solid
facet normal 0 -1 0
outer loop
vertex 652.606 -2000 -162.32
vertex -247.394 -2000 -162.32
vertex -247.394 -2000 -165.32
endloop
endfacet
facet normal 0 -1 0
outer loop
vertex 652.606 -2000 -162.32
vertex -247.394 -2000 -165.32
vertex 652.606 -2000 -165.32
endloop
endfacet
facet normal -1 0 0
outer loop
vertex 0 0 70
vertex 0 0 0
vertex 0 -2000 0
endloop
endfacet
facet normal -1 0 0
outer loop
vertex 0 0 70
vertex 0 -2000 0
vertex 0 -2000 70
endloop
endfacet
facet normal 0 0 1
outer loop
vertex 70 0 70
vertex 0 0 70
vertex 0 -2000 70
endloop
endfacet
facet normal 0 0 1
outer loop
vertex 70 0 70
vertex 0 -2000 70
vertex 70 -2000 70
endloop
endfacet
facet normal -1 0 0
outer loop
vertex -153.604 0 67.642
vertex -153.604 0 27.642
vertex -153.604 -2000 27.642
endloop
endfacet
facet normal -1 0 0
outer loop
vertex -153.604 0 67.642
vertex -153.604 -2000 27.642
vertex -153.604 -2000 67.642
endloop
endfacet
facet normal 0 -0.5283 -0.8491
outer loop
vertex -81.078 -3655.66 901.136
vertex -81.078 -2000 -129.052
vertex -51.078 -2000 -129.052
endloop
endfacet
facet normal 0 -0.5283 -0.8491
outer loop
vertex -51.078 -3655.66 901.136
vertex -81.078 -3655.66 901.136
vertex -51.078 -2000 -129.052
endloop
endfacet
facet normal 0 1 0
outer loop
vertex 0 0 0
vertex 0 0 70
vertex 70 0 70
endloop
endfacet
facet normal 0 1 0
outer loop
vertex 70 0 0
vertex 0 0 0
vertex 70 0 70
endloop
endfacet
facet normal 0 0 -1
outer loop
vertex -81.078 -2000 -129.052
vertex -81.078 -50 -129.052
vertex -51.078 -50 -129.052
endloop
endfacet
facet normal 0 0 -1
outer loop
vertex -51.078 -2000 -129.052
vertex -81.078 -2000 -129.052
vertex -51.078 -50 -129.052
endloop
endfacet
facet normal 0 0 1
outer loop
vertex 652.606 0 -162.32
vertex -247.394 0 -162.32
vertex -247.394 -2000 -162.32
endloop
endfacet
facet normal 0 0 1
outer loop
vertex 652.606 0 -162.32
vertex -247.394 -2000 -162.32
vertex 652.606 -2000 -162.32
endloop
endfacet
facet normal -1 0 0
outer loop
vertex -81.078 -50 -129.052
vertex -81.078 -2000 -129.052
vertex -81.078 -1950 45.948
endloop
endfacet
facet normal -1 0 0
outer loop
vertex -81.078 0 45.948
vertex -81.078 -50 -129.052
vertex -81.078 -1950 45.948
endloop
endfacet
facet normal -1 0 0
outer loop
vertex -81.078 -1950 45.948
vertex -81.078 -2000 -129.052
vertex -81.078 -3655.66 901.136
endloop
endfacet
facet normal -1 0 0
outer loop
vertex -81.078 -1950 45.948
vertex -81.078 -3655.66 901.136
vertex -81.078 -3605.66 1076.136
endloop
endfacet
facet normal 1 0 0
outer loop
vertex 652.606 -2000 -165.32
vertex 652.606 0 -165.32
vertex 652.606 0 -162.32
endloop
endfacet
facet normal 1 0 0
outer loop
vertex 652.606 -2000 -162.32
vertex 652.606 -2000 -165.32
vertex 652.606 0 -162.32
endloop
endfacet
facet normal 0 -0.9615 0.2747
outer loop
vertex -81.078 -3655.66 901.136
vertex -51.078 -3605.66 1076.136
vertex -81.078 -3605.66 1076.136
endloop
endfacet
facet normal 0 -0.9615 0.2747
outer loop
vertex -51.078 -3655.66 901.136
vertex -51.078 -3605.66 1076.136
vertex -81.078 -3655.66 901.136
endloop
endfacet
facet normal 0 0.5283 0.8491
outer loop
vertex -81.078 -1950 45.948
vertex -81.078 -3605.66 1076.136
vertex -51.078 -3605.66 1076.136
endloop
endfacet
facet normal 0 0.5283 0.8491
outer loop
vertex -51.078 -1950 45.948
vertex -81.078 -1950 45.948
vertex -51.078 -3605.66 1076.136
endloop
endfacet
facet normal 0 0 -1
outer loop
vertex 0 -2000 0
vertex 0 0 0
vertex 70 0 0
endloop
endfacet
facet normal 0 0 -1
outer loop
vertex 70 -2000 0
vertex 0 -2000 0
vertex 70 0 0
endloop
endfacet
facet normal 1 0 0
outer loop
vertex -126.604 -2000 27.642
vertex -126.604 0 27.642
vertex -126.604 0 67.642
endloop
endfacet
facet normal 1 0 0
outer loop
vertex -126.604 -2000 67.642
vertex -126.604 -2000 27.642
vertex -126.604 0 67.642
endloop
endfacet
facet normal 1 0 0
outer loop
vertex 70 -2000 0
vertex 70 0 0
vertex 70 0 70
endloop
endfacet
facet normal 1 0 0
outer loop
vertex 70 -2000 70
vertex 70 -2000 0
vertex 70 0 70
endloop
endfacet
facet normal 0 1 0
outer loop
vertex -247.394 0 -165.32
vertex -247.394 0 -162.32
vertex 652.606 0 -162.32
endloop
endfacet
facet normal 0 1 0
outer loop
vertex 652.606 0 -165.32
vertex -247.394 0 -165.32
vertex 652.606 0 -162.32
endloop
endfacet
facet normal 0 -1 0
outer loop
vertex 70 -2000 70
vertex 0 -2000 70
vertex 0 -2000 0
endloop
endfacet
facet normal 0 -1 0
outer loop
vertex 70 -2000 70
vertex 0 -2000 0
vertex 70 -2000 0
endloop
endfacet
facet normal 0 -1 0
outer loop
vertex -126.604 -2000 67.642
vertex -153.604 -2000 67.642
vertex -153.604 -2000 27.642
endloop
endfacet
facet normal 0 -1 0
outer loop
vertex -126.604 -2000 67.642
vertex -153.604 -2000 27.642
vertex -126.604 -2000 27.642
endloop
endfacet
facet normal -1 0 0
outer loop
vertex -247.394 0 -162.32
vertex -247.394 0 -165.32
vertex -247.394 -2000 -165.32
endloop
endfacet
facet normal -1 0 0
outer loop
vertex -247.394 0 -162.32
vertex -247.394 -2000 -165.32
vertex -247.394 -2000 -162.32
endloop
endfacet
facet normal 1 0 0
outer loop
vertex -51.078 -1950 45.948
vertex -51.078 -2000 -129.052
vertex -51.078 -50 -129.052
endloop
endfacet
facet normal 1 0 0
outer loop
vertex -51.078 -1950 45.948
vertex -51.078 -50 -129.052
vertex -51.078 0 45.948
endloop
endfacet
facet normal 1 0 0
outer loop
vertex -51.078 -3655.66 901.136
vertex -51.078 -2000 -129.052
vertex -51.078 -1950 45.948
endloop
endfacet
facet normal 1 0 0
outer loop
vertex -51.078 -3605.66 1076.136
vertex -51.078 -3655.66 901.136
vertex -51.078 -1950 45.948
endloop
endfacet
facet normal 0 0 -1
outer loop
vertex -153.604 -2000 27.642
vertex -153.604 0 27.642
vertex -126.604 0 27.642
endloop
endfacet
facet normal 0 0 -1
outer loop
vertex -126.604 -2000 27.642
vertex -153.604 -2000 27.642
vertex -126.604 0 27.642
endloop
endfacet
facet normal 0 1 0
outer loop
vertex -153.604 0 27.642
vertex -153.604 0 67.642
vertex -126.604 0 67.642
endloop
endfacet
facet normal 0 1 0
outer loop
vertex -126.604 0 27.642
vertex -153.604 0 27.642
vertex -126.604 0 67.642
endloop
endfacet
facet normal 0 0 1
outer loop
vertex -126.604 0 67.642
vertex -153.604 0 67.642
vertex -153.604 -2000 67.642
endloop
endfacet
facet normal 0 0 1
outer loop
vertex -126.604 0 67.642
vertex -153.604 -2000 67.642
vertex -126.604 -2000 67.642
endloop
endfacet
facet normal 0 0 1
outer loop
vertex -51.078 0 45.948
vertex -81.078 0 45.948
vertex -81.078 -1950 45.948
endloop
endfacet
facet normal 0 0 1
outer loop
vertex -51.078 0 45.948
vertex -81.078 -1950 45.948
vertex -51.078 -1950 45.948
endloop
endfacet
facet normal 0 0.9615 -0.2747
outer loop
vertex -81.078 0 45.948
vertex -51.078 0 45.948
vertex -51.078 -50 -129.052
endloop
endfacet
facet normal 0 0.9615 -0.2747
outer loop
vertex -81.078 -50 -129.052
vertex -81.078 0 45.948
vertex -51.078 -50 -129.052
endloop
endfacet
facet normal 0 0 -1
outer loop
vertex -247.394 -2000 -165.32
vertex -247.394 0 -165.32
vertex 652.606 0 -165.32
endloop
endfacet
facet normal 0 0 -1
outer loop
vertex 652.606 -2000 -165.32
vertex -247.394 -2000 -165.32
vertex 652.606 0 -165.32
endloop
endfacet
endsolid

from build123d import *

# Parameters (mm, degrees)
F0_W     = 70
F0_H     = 70
F1_DEPTH = 2000
F2_W     = 30
F2_H     = 175
F3_DEPTH = 2000
F4_W     = 27
F4_H     = 40
F5_DEPTH = 2000
F6_W     = 900
F6_H     = 3
F7_DEPTH = 2000
F9_DEPTH = 30


with BuildPart() as f1:
    # F0 (on Front) → F1 (new body)
    with BuildSketch(Plane.XZ):
        with Locations((35, 35)):
            Rectangle(F0_W, F0_H)
    extrude(amount=F1_DEPTH)


with BuildPart() as f3:
    # F2 (on Front) → F3 (new body)
    with BuildSketch(Plane.XZ):
        with Locations((-66.078197351, -41.5524188429)):
            Rectangle(F2_W, F2_H)
    extrude(amount=F3_DEPTH)

    # F8 (on face) → F9 (cut, through all)
    with BuildSketch(Plane.YZ.offset(-51.078197351)):
        Polygon((0, 45.9475811571), (-50, -129.0524188429), (0, -129.0524188429), align=None)
        Polygon((-2000, 45.9475811571), (-2000, -129.0524188429), (-1950, 45.9475811571), align=None)
    extrude(amount=-F9_DEPTH, mode=Mode.SUBTRACT)

    # F10: F3 across face


with BuildPart() as f5:
    # F4 (on Front) → F5 (new body)
    with BuildSketch(Plane.XZ):
        with Locations((-140.1035415985, 47.6421695203)):
            Rectangle(F4_W, F4_H)
    extrude(amount=F5_DEPTH)


with BuildPart() as f7:
    # F6 (on Front) → F7 (new body)
    with BuildSketch(Plane.XZ):
        with Locations((202.6055902243, -163.8198691128)):
            Rectangle(F6_W, F6_H)
    extrude(amount=F7_DEPTH)


with BuildPart() as f3_1:
    add(f3.part)
    add(f3.part.mirror(Plane(origin=(-66.078197351, -1975, -41.5524188429), x_dir=(1, 0, 0), z_dir=(0, -0.9615239476, 0.2747211279))))


solid = Compound([f1.part, f5.part, f7.part, f3_1.part])
